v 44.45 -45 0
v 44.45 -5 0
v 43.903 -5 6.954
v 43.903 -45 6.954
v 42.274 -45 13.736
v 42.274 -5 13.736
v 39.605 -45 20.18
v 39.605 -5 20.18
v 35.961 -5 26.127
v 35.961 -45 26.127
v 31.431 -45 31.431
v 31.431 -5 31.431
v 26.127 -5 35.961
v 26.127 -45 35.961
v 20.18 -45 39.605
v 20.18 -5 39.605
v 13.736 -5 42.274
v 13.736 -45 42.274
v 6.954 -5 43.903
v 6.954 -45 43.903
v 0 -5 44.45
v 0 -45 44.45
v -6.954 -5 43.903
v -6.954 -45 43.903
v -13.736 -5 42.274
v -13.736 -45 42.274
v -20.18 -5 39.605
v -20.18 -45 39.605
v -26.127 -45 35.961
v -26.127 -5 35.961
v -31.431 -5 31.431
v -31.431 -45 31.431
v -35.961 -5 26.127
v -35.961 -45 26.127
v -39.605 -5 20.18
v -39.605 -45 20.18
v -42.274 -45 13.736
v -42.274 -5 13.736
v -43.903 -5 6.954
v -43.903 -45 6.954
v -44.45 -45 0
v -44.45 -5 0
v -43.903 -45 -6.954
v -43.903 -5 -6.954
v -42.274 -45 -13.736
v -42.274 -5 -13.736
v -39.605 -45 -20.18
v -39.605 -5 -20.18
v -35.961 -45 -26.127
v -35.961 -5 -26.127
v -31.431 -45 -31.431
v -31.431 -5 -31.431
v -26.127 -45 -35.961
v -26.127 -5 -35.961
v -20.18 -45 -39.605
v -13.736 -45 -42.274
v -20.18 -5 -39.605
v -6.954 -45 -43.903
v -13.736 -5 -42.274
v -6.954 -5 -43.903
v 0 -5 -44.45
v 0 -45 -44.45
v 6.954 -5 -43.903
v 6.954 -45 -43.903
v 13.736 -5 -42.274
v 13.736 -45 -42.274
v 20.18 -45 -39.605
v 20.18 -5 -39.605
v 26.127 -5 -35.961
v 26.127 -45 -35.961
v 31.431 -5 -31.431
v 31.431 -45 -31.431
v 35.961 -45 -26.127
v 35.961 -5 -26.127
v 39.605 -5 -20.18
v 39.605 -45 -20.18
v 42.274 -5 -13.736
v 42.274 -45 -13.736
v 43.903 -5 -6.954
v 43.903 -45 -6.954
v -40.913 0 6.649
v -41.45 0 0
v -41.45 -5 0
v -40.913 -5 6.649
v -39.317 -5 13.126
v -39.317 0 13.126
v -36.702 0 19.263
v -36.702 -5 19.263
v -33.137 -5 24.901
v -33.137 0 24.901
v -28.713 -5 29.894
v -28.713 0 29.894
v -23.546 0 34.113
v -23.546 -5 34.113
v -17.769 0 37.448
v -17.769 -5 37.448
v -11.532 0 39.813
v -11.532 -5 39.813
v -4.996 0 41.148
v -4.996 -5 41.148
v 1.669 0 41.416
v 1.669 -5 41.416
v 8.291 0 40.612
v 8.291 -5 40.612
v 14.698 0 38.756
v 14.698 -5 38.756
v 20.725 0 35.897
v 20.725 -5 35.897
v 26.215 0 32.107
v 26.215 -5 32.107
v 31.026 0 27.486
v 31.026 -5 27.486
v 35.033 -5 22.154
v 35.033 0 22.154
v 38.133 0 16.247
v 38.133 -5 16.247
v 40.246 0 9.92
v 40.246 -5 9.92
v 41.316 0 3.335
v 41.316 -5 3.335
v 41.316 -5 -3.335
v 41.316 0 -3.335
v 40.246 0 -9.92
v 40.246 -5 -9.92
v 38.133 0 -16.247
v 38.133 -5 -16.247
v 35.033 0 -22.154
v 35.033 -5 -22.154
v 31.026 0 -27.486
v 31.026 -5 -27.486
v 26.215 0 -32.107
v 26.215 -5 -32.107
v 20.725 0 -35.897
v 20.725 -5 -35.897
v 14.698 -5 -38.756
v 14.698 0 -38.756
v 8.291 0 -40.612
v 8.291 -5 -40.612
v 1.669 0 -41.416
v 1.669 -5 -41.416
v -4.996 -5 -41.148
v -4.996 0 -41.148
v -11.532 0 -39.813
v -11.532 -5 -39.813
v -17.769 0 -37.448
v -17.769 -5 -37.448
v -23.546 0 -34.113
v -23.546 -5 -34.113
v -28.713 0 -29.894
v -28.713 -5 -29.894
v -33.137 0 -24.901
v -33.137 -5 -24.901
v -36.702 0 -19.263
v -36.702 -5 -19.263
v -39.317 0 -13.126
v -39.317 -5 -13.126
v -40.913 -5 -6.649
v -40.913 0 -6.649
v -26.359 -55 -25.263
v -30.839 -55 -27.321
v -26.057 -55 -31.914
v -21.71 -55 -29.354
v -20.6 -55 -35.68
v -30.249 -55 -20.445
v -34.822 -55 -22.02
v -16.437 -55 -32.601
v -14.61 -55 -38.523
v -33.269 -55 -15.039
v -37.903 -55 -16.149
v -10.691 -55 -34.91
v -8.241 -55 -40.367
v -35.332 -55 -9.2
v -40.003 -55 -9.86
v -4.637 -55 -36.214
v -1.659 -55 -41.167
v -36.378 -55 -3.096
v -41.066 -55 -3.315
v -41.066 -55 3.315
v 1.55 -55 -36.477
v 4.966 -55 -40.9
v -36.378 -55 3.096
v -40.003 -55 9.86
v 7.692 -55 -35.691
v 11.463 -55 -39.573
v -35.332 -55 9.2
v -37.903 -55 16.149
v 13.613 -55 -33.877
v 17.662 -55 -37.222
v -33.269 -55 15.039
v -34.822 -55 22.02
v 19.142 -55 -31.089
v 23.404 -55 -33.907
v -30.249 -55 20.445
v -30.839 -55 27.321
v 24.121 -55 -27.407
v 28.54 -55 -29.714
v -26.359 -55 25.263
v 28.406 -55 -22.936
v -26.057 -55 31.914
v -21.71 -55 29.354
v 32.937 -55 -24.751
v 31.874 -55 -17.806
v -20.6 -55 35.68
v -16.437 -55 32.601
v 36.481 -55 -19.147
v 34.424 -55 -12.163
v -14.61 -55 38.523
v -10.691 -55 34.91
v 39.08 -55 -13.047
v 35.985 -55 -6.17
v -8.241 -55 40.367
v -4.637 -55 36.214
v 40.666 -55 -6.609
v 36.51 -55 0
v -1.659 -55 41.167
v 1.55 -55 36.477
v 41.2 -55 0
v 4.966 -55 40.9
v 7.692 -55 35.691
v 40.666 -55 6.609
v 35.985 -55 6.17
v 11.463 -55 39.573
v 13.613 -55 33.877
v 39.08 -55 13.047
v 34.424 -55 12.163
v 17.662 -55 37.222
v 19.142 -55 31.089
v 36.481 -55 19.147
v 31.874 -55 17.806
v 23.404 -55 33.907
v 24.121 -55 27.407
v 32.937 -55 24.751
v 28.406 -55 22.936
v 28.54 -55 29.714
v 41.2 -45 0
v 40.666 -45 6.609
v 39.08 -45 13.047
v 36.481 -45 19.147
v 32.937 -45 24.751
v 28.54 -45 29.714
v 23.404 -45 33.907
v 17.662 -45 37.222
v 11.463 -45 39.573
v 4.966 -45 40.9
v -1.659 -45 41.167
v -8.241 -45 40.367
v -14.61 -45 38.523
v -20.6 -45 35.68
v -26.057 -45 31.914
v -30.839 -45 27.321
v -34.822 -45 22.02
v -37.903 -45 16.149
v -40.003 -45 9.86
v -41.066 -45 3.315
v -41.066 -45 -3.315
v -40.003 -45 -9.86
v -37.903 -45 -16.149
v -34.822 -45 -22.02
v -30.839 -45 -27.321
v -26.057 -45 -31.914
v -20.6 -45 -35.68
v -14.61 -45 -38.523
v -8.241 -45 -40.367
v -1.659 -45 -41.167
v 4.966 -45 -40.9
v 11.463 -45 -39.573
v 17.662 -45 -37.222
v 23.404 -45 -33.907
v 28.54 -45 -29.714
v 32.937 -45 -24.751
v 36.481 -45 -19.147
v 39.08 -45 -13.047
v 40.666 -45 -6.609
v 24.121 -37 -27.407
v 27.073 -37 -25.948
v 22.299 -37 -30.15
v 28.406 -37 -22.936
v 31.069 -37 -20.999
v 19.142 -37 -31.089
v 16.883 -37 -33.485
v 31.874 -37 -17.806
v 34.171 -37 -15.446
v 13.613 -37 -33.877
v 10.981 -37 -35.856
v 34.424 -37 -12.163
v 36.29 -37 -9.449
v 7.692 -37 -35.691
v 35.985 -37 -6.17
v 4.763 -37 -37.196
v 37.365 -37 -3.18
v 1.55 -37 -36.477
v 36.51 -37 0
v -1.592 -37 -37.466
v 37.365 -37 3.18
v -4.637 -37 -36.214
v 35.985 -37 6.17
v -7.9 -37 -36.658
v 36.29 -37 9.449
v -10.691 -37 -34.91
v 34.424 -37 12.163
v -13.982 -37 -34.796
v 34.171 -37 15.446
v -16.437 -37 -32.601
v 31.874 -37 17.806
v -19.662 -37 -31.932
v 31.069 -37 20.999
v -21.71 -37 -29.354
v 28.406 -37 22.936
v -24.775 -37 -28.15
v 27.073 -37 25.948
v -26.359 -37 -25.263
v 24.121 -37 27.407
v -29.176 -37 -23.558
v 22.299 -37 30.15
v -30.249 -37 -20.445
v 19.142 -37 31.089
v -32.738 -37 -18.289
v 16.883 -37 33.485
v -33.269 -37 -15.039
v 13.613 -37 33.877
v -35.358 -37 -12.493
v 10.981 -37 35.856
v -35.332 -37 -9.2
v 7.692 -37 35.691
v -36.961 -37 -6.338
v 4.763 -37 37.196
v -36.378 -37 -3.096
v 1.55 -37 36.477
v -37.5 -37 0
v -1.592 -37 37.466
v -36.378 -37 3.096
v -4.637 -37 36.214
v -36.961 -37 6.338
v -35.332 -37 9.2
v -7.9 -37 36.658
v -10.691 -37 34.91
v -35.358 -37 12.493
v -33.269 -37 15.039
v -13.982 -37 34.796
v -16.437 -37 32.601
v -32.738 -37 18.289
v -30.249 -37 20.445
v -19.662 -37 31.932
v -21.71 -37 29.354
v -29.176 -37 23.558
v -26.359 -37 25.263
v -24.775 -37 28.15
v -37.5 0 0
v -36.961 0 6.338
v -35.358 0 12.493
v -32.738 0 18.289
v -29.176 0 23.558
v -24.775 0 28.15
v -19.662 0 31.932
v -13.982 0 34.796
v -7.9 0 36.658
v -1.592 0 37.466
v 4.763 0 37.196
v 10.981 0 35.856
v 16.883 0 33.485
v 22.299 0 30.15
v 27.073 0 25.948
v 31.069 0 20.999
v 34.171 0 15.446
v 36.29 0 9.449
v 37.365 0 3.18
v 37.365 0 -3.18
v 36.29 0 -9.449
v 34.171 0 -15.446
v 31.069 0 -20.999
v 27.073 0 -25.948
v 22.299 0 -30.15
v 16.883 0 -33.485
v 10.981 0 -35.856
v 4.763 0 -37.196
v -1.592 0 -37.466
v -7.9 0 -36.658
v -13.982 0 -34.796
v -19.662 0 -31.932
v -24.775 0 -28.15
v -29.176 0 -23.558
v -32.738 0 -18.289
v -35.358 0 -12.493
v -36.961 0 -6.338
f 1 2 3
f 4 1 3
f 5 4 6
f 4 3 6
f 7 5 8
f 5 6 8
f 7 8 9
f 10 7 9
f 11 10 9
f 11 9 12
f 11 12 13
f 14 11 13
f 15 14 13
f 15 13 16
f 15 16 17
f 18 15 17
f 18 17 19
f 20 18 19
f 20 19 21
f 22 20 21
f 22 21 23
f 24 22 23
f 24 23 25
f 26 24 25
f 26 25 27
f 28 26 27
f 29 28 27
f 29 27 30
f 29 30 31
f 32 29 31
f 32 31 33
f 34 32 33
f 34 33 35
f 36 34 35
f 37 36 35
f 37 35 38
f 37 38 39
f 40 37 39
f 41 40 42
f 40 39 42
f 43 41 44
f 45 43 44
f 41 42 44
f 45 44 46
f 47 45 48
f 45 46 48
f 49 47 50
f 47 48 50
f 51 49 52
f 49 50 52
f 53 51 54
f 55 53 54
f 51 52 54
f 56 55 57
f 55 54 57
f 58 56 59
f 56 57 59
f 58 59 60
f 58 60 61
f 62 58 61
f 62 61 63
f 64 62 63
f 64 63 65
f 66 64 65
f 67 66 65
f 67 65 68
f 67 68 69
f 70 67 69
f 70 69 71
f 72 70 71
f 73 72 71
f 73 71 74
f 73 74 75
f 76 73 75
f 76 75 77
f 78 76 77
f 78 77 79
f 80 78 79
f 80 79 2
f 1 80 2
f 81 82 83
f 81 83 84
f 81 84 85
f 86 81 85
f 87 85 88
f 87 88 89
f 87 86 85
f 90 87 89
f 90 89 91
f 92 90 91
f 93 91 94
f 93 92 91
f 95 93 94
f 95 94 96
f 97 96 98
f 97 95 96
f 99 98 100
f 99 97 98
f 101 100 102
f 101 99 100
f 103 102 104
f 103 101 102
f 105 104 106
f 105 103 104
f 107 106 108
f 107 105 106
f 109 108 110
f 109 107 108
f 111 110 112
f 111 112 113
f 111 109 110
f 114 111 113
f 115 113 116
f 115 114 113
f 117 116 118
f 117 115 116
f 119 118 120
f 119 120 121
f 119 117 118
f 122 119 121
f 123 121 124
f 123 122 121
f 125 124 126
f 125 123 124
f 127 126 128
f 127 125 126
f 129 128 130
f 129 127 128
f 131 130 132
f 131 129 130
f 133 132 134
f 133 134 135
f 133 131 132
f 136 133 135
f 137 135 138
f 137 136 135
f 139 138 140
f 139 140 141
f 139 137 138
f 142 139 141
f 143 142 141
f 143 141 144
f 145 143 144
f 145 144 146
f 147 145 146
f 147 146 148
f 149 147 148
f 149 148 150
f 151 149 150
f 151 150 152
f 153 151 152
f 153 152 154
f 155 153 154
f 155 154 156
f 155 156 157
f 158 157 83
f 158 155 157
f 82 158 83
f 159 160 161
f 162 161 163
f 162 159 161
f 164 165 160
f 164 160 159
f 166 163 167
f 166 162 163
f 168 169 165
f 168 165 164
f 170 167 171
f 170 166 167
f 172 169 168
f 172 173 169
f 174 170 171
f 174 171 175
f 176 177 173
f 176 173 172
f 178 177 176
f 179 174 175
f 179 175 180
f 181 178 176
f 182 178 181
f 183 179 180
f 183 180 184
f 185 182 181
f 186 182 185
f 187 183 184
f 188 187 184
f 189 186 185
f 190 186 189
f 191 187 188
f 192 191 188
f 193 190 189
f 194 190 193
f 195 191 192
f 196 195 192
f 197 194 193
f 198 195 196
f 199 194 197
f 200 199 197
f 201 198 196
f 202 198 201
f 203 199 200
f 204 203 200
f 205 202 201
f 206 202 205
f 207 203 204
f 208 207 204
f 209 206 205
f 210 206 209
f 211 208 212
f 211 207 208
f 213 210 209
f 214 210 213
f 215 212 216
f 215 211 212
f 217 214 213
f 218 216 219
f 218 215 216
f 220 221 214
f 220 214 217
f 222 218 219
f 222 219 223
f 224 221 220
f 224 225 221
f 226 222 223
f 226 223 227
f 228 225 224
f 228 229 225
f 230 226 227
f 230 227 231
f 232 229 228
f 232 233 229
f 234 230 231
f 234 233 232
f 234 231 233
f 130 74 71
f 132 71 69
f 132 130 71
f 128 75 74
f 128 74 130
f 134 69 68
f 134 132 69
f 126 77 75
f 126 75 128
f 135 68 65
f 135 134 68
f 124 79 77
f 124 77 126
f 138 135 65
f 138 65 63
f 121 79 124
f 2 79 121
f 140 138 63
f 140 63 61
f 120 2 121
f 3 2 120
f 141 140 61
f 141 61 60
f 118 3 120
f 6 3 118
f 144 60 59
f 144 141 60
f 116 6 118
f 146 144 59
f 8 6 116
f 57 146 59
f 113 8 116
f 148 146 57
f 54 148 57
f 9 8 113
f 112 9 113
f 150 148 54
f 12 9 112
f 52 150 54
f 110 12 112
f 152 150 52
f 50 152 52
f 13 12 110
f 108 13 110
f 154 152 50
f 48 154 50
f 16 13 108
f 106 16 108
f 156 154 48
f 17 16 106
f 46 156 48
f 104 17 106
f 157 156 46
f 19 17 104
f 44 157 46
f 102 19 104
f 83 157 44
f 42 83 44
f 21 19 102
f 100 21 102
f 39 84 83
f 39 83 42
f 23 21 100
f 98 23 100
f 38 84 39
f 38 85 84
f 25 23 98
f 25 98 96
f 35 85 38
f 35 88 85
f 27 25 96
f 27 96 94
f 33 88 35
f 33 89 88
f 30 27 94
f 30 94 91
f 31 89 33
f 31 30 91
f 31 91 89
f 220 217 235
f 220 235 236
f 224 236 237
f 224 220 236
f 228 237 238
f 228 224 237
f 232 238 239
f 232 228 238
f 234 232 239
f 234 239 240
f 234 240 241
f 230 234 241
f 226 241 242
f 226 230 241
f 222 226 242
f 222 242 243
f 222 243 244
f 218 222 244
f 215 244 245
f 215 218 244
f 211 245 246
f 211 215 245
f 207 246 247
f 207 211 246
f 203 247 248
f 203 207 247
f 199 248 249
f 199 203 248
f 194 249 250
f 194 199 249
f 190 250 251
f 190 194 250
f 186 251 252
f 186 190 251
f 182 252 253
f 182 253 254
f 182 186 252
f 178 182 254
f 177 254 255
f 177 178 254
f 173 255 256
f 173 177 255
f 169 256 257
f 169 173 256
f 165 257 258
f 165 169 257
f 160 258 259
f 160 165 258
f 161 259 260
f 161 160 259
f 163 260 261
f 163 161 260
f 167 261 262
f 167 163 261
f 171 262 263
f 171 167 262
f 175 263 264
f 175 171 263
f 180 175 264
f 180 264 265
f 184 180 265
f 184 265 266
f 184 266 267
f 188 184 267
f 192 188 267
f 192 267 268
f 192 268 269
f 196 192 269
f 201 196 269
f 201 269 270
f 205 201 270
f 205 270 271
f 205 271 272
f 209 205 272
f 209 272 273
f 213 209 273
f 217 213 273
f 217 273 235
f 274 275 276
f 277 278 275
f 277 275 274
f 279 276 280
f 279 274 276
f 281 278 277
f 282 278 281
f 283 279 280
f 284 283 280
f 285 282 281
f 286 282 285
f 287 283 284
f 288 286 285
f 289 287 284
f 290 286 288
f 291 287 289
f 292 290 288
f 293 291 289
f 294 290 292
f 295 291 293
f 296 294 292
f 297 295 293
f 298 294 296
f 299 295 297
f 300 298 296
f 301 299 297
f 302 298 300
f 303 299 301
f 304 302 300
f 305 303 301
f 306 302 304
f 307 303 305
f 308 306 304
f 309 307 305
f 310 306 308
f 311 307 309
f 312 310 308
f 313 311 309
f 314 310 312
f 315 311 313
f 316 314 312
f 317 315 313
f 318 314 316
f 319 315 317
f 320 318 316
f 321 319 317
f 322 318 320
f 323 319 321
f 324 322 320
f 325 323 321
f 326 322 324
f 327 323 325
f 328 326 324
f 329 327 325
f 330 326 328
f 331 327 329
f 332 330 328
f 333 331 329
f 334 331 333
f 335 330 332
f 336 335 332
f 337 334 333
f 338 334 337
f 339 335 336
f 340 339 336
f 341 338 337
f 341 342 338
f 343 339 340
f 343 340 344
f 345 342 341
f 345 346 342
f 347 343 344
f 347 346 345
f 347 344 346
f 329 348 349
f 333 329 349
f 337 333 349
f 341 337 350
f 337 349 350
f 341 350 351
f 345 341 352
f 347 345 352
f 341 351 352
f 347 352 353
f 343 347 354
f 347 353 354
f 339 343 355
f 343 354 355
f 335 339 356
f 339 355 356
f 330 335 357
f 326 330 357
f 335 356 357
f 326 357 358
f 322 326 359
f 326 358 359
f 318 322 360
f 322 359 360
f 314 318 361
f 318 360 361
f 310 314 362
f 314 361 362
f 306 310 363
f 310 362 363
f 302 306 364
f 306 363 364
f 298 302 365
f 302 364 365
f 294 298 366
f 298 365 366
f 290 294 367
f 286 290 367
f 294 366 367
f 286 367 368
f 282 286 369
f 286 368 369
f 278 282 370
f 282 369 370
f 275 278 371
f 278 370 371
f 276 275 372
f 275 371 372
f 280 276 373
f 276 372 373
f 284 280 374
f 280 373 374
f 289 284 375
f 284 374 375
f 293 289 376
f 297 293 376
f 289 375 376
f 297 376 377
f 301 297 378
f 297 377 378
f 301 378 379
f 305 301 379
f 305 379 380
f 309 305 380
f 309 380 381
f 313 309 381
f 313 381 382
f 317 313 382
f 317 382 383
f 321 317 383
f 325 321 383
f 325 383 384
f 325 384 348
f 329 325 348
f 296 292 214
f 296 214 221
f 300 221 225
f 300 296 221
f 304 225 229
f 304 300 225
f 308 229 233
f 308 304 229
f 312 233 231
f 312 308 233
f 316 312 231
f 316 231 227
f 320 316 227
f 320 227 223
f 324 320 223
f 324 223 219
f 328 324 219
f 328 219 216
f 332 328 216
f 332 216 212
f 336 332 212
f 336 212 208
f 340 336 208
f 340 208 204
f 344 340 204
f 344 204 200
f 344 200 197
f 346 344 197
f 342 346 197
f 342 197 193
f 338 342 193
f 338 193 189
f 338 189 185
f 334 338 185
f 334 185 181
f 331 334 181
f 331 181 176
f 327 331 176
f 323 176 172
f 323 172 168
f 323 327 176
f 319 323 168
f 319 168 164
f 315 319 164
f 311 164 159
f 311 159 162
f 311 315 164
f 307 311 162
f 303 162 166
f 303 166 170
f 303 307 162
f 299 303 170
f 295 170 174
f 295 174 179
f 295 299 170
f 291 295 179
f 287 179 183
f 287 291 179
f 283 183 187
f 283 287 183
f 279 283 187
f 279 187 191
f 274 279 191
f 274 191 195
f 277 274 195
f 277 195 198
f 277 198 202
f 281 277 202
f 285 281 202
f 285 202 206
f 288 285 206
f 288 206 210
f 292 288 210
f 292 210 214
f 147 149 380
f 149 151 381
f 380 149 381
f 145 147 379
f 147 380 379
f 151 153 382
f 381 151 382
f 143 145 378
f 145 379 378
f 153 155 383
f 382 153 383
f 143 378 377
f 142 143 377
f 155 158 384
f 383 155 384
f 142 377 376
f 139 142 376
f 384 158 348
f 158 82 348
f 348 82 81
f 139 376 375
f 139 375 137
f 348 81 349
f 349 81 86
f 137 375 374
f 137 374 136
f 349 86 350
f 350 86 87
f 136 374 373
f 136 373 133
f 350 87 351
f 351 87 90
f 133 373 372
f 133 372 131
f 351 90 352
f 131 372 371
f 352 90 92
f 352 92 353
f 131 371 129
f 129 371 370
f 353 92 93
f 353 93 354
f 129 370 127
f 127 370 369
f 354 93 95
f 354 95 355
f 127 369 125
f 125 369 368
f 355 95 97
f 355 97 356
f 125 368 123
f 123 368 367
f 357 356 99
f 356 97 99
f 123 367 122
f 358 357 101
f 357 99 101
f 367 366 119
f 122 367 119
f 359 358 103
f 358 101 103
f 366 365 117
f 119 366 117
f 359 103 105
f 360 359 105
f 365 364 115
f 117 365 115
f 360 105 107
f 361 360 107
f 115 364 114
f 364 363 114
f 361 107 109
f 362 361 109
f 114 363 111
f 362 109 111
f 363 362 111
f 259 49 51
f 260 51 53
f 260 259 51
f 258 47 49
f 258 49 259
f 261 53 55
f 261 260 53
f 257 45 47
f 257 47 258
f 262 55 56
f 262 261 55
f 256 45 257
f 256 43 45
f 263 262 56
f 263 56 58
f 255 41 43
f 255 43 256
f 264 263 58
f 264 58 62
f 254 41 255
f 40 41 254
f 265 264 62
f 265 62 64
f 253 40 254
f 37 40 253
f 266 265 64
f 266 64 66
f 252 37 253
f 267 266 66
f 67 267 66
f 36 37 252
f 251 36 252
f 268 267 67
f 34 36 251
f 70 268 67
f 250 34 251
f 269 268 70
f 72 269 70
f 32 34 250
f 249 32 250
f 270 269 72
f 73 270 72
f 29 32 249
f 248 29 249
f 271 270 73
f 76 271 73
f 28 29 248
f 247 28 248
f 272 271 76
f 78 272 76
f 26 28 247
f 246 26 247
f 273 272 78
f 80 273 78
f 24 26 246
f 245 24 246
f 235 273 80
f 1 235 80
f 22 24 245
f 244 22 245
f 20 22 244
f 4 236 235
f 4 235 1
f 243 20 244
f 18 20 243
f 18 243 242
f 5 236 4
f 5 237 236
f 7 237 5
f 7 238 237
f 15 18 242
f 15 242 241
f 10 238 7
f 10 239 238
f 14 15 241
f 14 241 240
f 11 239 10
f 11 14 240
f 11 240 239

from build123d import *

# Parameters (mm, degrees)
F0_R     = 44.45
F0_R_2   = 36.51
F1_DEPTH = 55
F2_R     = 44.45
F2_R_2   = 41.2
F3_DEPTH = 10
F4_R     = 44.45
F4_R_2   = 41.45
F5_DEPTH = 5
F4_R_3   = 37.5
F4_R_4   = 36.51
F6_DEPTH = 37


with BuildPart() as f1:
    # F0 (on Front) → F1 (new body)
    with BuildSketch(Plane.XZ):
        Circle(F0_R)
        Circle(F0_R_2, mode=Mode.SUBTRACT)
    extrude(amount=F1_DEPTH)

    # F2 (on face) → F3 (cut)
    with BuildSketch(Plane.XZ.offset(55)):
        Circle(F2_R)
        Circle(F2_R_2, mode=Mode.SUBTRACT)
    extrude(amount=-F3_DEPTH, mode=Mode.SUBTRACT)

    # F4 (on face) → F5 (cut)
    with BuildSketch(Plane(origin=(0, 0, 0), x_dir=(-1, 0, 0), z_dir=(0, 1, 0))):
        Circle(F4_R)
        Circle(F4_R_2, mode=Mode.SUBTRACT)
    extrude(amount=-F5_DEPTH, mode=Mode.SUBTRACT)

    # F4 (on face) → F6 (cut)
    with BuildSketch(Plane(origin=(0, 0, 0), x_dir=(-1, 0, 0), z_dir=(0, 1, 0))):
        Circle(F4_R_3)
        Circle(F4_R_4, mode=Mode.SUBTRACT)
    extrude(amount=-F6_DEPTH, mode=Mode.SUBTRACT)


solid = f1.part
